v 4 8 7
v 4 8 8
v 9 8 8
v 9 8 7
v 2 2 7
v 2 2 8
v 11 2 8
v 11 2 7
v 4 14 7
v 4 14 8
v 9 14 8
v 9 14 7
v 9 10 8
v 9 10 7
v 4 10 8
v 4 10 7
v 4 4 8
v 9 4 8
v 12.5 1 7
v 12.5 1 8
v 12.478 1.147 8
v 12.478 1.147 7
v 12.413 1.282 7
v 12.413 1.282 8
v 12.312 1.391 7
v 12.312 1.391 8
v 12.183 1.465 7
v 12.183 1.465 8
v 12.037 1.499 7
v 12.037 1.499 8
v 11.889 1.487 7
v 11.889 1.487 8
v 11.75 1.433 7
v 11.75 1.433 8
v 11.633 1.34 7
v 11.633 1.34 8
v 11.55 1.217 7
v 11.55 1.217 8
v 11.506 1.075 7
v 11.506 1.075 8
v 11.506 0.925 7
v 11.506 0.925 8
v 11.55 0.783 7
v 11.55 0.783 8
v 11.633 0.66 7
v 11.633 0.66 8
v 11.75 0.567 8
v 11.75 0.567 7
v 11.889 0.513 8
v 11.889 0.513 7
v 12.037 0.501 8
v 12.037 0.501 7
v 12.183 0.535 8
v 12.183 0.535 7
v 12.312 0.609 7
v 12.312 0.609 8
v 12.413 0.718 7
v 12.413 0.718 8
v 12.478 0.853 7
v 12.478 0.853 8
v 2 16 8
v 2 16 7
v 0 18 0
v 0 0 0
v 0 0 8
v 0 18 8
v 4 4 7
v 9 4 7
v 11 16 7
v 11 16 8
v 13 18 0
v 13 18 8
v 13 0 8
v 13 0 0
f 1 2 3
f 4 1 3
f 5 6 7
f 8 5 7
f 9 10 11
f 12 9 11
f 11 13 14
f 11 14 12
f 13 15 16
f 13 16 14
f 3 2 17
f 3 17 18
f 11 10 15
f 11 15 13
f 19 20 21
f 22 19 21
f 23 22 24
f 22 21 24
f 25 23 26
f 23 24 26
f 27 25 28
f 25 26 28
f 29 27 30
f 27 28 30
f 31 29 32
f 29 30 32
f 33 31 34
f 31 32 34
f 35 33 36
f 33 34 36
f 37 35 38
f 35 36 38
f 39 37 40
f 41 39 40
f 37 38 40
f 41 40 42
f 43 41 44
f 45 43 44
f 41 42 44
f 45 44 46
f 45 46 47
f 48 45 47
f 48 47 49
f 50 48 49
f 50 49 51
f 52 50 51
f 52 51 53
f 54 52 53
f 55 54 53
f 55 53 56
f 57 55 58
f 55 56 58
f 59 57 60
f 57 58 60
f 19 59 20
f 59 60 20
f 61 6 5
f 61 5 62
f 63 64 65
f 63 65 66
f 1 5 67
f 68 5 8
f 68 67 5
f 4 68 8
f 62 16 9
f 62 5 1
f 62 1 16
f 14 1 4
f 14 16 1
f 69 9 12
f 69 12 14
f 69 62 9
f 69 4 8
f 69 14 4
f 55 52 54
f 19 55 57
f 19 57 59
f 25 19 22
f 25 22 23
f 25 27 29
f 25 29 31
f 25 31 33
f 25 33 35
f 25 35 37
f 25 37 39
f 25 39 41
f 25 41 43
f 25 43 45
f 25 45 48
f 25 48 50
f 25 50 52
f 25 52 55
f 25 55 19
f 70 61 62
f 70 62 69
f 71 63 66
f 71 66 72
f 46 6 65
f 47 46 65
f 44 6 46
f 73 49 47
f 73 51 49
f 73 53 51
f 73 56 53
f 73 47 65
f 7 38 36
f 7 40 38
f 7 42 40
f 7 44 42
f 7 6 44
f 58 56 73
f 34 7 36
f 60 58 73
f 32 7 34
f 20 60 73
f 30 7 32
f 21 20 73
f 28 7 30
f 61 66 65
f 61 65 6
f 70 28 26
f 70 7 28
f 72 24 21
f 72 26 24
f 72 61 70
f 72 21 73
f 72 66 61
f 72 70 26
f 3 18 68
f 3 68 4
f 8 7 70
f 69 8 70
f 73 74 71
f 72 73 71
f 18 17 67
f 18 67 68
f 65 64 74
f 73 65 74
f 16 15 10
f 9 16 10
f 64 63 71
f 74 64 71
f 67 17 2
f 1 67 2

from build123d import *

# Parameters (mm, degrees)
ESQUISSE1_W             = 13
ESQUISSE1_H             = 18
BOSS_EXTRU_1_DEPTH      = 8
ESQUISSE2_R             = 0.5
ESQUISSE2_W             = 9
ESQUISSE2_H             = 14
ESQUISSE2_W_2           = 5
ESQUISSE2_H_2           = 4
ENL_V_MAT_EXTRU_1_DEPTH = 1


with BuildPart() as part:
    # Esquisse1 → Boss.-Extru.1 (new body)
    with BuildSketch(Plane.XY):
        with Locations((6.5, 9)):
            Rectangle(ESQUISSE1_W, ESQUISSE1_H)
    extrude(amount=BOSS_EXTRU_1_DEPTH)

    # Esquisse2 → Enlèv. mat.-Extru.1 (cut)
    with BuildSketch(Plane.XY.offset(8)):
        with Locations((12, 1)):
            Circle(ESQUISSE2_R)
        with Locations((6.5, 9)):
            Rectangle(ESQUISSE2_W, ESQUISSE2_H)
        with Locations((6.5, 12)):
            Rectangle(ESQUISSE2_W_2, ESQUISSE2_H_2, mode=Mode.SUBTRACT)
        with Locations((6.5, 6)):
            Rectangle(ESQUISSE2_W_2, ESQUISSE2_H_2, mode=Mode.SUBTRACT)
    extrude(amount=-ENL_V_MAT_EXTRU_1_DEPTH, mode=Mode.SUBTRACT)


solid = part.part
